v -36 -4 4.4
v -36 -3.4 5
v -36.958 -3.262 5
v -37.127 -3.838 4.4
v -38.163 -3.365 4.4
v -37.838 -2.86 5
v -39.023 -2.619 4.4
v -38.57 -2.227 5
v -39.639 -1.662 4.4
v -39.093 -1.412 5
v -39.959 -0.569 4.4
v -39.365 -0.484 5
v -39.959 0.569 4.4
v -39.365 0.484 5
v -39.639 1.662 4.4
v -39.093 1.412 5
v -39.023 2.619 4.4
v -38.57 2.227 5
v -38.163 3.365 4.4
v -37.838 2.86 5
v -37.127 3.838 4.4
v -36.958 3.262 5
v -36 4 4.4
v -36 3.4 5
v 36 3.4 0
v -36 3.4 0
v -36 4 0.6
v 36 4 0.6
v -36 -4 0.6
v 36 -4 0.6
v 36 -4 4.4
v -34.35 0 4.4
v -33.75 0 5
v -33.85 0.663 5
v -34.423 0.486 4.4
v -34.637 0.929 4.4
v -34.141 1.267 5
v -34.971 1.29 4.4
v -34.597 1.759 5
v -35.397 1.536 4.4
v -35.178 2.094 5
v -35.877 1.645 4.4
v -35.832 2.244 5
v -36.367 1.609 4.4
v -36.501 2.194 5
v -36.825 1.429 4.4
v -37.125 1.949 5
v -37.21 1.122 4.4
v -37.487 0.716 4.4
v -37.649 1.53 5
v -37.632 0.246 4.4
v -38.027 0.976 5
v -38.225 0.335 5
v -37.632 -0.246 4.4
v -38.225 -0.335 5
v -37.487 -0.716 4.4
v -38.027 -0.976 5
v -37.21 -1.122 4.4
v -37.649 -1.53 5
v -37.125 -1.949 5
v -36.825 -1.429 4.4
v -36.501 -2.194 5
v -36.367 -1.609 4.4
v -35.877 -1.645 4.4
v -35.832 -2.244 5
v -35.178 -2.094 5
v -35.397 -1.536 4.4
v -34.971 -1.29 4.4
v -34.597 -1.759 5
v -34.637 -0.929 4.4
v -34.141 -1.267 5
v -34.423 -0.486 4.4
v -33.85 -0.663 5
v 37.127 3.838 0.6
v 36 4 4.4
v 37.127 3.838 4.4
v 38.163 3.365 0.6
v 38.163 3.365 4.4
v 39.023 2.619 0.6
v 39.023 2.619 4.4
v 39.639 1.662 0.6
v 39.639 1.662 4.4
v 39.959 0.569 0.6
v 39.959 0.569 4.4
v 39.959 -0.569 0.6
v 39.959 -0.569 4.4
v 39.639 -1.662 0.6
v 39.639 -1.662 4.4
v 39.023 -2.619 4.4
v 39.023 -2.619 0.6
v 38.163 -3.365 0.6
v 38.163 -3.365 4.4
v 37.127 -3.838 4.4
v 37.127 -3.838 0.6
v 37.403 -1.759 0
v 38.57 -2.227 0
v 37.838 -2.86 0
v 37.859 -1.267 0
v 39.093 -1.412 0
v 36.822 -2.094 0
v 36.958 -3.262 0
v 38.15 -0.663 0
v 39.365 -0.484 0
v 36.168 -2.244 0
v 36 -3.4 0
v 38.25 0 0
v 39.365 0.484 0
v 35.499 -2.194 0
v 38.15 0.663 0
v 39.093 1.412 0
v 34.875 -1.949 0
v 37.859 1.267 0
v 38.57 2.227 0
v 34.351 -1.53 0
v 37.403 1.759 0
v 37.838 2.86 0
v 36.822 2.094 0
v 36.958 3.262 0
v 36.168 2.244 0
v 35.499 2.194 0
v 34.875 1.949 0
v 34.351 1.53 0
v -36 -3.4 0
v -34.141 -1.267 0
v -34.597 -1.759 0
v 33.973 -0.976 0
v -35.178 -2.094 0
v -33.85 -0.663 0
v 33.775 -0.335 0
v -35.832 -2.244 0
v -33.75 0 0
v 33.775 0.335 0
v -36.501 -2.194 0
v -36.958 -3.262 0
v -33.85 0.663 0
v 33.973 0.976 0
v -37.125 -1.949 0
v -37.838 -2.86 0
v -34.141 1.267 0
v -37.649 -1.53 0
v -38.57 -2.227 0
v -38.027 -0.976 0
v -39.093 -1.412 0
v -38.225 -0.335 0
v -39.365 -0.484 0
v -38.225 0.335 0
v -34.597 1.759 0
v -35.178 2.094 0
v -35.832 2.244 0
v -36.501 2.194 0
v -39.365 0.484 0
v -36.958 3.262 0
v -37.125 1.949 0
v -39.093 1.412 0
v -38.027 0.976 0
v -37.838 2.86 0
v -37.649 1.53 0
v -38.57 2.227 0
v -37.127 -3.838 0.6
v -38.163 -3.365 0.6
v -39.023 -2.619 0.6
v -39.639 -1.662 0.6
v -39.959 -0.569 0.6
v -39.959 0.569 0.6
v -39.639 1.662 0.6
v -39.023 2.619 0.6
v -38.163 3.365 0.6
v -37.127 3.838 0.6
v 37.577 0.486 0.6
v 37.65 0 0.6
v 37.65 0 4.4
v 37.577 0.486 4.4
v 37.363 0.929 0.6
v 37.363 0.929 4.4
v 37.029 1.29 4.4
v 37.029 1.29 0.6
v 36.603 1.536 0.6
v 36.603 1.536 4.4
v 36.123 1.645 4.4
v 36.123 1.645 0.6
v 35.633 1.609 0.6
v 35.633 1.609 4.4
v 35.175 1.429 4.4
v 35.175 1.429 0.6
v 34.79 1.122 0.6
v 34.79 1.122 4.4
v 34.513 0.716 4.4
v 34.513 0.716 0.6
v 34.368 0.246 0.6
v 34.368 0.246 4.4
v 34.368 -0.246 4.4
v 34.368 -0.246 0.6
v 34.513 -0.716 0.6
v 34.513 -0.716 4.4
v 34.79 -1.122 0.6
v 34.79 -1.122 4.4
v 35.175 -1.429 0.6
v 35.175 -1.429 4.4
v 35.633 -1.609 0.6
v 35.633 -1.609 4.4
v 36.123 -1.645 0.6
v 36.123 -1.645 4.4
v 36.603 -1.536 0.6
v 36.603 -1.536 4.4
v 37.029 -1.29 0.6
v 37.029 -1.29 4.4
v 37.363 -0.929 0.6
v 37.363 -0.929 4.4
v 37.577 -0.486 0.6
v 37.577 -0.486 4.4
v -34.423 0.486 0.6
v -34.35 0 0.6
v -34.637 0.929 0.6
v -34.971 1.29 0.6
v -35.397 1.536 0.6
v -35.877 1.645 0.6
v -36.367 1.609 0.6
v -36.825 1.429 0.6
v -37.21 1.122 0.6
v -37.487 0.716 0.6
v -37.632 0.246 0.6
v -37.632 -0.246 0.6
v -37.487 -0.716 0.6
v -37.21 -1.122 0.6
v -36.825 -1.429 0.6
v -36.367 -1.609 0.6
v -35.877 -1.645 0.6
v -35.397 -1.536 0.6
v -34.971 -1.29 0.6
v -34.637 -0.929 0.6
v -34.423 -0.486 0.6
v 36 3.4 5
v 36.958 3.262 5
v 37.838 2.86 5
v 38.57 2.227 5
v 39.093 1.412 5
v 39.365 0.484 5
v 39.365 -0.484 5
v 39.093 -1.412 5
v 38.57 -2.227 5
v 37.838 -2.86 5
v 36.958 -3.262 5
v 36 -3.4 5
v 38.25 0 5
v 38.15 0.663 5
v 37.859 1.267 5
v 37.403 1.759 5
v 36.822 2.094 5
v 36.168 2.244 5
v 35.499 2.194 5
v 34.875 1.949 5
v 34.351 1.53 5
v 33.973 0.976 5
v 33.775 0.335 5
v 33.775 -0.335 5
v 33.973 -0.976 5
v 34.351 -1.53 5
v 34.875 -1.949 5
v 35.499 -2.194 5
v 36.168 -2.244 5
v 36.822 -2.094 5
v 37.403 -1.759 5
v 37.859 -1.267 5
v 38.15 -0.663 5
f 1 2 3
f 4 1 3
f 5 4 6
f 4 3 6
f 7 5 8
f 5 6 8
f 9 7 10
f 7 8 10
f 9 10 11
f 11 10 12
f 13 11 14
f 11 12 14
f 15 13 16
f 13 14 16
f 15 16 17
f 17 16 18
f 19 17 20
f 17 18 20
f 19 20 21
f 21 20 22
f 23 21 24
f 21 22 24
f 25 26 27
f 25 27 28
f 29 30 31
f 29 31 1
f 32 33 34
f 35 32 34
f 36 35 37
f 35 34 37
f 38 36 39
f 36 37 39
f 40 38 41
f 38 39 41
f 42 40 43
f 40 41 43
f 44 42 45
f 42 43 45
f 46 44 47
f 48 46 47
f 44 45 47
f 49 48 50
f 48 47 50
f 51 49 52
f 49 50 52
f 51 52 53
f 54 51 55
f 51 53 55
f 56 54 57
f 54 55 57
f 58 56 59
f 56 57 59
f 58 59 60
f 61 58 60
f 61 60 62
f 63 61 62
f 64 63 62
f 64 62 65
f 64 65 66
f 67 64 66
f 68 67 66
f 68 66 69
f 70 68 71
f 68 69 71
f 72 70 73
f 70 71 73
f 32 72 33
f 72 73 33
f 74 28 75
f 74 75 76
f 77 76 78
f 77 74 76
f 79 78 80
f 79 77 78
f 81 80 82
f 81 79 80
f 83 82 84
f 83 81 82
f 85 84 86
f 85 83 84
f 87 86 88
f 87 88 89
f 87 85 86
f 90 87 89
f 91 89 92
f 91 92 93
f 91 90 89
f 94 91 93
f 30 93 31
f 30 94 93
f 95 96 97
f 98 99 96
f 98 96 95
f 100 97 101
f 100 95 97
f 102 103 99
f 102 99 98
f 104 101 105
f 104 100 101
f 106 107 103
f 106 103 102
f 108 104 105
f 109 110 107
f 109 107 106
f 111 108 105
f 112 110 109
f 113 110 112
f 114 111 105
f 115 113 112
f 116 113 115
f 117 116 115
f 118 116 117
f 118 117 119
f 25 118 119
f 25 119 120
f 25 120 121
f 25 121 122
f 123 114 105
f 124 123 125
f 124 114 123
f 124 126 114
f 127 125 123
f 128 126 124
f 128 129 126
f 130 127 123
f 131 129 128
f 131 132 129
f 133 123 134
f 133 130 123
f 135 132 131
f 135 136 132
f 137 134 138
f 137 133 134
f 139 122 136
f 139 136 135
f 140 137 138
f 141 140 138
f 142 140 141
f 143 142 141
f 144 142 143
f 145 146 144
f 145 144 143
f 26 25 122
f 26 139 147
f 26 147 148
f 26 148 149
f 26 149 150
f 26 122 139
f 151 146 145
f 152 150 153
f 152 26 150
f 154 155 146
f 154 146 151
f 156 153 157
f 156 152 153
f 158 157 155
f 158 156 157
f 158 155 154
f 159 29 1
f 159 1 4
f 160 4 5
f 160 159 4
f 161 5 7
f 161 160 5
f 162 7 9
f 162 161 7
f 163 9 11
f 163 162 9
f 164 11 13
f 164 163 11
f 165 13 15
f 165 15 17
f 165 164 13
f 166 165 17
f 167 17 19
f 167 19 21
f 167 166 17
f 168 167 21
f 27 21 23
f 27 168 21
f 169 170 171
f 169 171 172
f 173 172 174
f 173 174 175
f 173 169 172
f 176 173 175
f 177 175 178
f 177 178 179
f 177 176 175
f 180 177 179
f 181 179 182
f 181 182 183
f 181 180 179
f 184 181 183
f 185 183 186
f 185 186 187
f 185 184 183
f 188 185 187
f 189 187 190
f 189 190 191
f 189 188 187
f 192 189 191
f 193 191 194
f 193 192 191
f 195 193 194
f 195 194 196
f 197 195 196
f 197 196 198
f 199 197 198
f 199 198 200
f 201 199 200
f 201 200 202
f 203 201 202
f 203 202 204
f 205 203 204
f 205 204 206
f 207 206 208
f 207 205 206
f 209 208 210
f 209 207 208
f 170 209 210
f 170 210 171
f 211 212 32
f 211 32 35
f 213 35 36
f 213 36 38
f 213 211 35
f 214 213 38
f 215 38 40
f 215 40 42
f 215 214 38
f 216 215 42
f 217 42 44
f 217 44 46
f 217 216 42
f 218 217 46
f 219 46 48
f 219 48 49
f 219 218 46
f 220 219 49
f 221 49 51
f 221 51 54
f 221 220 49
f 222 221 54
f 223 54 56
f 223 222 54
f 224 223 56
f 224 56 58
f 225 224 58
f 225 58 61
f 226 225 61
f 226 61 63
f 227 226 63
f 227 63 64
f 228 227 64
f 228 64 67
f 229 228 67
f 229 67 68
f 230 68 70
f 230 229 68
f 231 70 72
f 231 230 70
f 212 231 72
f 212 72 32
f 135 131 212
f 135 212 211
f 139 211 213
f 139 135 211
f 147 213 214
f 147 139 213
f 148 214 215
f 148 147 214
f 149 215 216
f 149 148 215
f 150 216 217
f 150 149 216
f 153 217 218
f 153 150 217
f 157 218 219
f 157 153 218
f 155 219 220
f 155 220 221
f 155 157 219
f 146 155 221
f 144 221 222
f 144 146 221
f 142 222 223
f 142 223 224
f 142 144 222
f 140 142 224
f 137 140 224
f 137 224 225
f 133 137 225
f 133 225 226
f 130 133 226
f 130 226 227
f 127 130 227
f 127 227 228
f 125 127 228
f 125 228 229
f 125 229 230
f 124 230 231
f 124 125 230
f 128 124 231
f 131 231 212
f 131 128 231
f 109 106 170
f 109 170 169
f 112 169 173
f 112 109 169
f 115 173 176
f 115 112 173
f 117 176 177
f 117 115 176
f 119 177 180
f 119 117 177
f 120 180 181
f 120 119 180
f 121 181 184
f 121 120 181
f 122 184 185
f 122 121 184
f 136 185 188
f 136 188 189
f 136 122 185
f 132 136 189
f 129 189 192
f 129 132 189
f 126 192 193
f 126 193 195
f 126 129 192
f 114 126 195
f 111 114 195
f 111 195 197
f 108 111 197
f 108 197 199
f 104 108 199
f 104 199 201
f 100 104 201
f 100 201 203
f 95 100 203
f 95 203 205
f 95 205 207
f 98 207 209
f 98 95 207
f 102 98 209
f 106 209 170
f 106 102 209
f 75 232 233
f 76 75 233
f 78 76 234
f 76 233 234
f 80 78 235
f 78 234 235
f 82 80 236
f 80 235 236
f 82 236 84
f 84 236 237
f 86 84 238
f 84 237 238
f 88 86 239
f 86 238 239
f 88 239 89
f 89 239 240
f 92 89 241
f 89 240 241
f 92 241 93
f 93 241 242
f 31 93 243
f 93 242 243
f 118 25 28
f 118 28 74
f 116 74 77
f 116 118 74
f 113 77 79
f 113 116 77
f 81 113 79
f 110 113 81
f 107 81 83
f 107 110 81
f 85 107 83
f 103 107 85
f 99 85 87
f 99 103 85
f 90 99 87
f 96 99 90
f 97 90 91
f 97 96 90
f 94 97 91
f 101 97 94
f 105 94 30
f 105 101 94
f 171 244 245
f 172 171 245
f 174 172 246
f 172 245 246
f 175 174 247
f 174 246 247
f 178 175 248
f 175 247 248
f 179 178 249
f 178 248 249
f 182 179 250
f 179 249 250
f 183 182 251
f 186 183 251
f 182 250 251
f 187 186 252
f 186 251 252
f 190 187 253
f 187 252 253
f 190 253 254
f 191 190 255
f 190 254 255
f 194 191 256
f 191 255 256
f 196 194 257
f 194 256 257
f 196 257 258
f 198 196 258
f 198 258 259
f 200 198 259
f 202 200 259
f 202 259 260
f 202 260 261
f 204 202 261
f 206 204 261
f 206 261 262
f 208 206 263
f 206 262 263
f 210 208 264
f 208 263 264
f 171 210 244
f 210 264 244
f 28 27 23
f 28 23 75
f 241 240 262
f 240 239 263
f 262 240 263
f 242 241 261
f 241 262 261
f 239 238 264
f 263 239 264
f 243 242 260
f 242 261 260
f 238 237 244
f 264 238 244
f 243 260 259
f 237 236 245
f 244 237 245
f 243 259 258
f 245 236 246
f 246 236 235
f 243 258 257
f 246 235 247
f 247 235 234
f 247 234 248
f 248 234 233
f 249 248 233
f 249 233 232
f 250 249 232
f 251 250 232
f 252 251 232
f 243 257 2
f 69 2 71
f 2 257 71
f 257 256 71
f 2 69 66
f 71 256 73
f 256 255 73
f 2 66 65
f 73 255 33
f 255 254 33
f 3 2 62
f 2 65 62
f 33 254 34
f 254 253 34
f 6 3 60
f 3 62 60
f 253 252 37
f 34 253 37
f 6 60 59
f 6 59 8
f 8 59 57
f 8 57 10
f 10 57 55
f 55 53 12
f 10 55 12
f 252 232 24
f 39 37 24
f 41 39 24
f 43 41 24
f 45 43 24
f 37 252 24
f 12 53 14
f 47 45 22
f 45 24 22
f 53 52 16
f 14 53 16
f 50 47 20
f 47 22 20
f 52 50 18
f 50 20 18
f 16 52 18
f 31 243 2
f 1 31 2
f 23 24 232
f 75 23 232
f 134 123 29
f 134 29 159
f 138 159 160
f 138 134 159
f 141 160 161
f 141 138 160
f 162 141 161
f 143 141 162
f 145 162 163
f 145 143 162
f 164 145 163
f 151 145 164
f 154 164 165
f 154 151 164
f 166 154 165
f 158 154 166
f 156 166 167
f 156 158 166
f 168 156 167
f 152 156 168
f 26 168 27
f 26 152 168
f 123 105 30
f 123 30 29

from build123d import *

# Parameters (mm, degrees)
SKETCH_1_R      = 1.65
EXTRUDE_1_DEPTH = 5
CHAMFER_1_SIZE  = 0.6


with BuildPart() as part:
    # 草图1 → 凸台-拉伸1 (new body)
    with BuildSketch(Plane.XY):
        with BuildLine():
            Line((-36, 4), (36, 4))
            ThreePointArc((36, 4), (40, 0), (36, -4))
            Line((36, -4), (-36, -4))
            ThreePointArc((-36, -4), (-40, 0), (-36, 4))
        make_face()
        with Locations((-36, 0)):
            Circle(SKETCH_1_R, mode=Mode.SUBTRACT)
        with Locations((36, 0)):
            Circle(SKETCH_1_R, mode=Mode.SUBTRACT)
    extrude(amount=EXTRUDE_1_DEPTH)

    # 倒角1
    chamfer_1_edges = [part.edges().sort_by_distance(p)[0] for p in [
        (-37.65, 0, 0),
        (-37.65, 0, 5),
        (40, 0, 5),
        (34.35, 0, 0),
        (34.35, 0, 5),
        (0, 4, 5),
        (-40, 0, 5),
        (0, 4, 0),
        (40, 0, 0),
        (0, -4, 0),
        (-40, 0, 0),
        (0, -4, 5),
    ]]
    chamfer(chamfer_1_edges, length=CHAMFER_1_SIZE)


solid = part.part
